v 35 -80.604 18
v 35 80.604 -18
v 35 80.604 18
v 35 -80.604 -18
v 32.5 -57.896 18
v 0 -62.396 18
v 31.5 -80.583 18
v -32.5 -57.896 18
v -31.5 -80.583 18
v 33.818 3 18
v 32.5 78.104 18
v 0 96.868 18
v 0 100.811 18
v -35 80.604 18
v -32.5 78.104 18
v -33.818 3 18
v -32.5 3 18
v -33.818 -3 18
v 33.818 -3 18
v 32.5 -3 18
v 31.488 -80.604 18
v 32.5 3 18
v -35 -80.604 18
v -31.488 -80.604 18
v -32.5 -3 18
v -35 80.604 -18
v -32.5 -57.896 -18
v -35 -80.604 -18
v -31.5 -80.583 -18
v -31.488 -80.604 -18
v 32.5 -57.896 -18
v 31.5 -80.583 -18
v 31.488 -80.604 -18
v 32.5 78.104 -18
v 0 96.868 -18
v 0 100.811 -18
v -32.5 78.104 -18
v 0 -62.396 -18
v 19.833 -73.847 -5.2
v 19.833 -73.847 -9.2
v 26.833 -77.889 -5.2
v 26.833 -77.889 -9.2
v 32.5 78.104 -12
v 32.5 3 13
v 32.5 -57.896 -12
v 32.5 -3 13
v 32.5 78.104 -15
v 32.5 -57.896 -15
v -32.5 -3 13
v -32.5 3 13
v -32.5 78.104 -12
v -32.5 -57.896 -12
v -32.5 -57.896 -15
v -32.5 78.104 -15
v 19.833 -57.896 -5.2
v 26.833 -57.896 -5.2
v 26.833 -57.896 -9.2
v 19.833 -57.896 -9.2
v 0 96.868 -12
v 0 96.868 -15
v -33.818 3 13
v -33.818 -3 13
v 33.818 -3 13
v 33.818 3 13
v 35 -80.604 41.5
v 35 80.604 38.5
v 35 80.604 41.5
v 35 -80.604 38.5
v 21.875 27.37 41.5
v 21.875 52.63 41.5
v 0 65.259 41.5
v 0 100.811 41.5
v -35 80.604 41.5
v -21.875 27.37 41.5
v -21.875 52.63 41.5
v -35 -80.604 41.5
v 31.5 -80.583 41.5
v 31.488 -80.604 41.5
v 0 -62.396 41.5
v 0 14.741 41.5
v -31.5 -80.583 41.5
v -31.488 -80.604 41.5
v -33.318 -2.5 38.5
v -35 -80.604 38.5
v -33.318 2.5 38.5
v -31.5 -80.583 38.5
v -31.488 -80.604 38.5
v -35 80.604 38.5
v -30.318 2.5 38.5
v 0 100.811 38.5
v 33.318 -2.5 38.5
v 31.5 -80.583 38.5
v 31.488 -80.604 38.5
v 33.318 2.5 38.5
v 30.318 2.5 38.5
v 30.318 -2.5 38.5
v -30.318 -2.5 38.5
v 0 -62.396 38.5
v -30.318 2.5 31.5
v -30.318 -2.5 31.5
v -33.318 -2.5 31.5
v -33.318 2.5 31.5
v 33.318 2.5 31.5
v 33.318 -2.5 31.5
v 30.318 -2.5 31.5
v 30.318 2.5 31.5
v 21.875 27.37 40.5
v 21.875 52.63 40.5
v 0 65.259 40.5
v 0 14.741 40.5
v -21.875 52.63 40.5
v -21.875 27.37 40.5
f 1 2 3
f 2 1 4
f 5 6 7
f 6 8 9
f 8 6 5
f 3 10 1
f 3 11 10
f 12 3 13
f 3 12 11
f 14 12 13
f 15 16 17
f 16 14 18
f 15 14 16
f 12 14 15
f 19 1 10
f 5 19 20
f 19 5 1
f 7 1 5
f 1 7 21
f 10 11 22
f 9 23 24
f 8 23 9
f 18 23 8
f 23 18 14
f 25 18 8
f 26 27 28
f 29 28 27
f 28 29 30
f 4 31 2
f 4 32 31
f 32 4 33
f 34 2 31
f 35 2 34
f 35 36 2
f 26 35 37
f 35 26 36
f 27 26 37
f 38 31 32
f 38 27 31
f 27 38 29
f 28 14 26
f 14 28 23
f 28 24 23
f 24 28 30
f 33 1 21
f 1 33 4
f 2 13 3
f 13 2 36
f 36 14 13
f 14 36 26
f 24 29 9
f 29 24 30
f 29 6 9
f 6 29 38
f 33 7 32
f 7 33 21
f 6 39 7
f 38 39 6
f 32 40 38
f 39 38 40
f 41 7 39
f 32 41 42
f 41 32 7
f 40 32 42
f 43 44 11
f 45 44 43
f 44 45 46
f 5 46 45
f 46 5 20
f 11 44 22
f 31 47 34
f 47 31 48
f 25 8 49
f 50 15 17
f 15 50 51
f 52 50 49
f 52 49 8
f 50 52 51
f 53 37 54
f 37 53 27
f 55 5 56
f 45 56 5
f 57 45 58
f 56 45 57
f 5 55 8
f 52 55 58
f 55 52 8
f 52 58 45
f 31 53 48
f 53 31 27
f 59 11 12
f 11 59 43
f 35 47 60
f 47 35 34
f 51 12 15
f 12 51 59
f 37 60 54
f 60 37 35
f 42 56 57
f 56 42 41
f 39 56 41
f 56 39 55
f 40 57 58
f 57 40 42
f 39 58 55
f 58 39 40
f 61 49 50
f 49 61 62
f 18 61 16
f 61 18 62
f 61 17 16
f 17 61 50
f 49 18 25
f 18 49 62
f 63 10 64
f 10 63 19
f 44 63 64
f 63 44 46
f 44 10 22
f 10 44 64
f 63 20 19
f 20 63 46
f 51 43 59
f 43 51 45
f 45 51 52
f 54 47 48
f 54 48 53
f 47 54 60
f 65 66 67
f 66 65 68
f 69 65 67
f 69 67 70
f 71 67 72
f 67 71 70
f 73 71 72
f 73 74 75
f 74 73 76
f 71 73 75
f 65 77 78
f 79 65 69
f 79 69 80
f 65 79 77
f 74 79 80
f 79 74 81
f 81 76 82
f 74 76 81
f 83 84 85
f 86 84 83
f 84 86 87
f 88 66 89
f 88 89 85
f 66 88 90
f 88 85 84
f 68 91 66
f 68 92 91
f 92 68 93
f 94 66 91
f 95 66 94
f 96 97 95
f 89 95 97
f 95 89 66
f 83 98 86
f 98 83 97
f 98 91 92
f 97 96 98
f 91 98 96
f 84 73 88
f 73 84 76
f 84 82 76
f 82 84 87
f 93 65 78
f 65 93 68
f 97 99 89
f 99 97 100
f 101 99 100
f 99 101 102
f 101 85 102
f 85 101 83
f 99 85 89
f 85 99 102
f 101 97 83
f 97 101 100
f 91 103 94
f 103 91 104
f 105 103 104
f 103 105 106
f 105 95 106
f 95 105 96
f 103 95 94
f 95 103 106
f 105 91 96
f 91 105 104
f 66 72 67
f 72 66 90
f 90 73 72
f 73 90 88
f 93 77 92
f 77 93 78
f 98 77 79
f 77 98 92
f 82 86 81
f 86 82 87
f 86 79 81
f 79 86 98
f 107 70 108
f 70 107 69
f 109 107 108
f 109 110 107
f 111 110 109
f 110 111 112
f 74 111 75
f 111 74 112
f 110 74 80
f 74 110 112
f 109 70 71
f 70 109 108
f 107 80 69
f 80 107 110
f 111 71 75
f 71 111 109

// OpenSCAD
$fn = 100;

// Functions for calculating the half-hexagons
function edge_length(width) = (width/2) / cos(30); // CAH
function point_height(width) = (width/2) * tan(30); // TOA
function leg(width) = edge_length(width) * sqrt(1/2);
function x_offset(width) = (width/2) - (leg(width) * cos(15));
function y_offset(width, length) = (length/2) - (leg(width) * sin(15));

//function x_offset2(width) = (width/2) + (leg(width) * sin(15));
function y_offset2(width, length) = (length/2) + (leg(width) * cos(15)) - point_height(w) + 2; // +2 is arbitrary, should fix.

// Values for wall thickness
h_pad = -1;
w_pad = 5;
l_pad = 5;

// Core size variables
lip = 3;
h = 33 + lip;
w = 65 + w_pad;
l = 86 + 50 + l_pad + point_height(w); // 86 = Pi, 50 = Dongle

btm = w*0.9;

difference(){ // Between the exterior and interior
// The exterior shape
difference(){ // For the btm (bottom) cutout
union(){
cube([w, l, h], center=true); // Center Cube

translate([x_offset(w),y_offset(w,l),0]){
	rotate([0,0,-30]) cube([edge_length(w),edge_length(w),h], center=true);
}
translate([-x_offset(w),y_offset(w,l),0]){
	rotate([0,0,30]) cube([edge_length(w),edge_length(w),h], center=true);
}}
translate([-x_offset(btm),-y_offset2(btm,l),0]){
	rotate([0,0,30]) cube([edge_length(btm),edge_length(btm),h-h_pad], center=true);
}
translate([x_offset(btm),-y_offset2(btm,l),0]){
	rotate([0,0,-30]) cube([edge_length(btm),edge_length(btm),h-h_pad], center=true);
}}

// The interior cutout
union(){
translate([0,point_height(w)/2,0]){
cube([w-w_pad, l-l_pad- point_height(w), h-h_pad], center=true); // Center Cube
}
translate([x_offset(w-w_pad),y_offset(w-w_pad,l-l_pad),0]){
	rotate([0,0,-30]) cube([edge_length(w-w_pad),edge_length(w-w_pad),h-h_pad], center=true);
}
translate([-x_offset(w-w_pad),y_offset(w-w_pad,l-l_pad),0]){
	rotate([0,0,30]) cube([edge_length(w-w_pad),edge_length(w-w_pad),h-h_pad], center=true);
}}
translate([w/3,-l/2+point_height(w),-h/5]){cube([7, 40, 4], center=true);}
translate([-w/2.2,0,h/2]){cube([4, 6, 10], center=true);}
translate([w/2.2,0,h/2]){cube([4, 6, 10], center=true);}
}


// The floor of the case
translate([0,0,-(h/2)+(h_lid/2)+lip]){
difference(){
union(){
cube([w, l, h_lid], center=true); // Center Cube

translate([x_offset(w),y_offset(w,l),0]){
	rotate([0,0,-30]) cube([edge_length(w),edge_length(w),h_lid], center=true);
}
translate([-x_offset(w),y_offset(w,l),0]){
	rotate([0,0,30]) cube([edge_length(w),edge_length(w),h_lid], center=true);
}}
translate([-x_offset(btm),-y_offset2(btm,l),0]){
	rotate([0,0,30]) cube([edge_length(btm),edge_length(btm),h_lid-h_pad], center=true);
}
translate([x_offset(btm),-y_offset2(btm,l),0]){
	rotate([0,0,-30]) cube([edge_length(btm),edge_length(btm),h_lid-h_pad], center=true);
}}}


// The lid
h_lid = 3;
function hex_len(width) = 2 * (cos(30) * width);
hex_edge = edge_length(w/1.6);

translate([0,0,40]){
difference(){
difference(){
union(){
cube([w, l, h_lid], center=true); // Center Cube
translate([-w/2.2,0,-h_lid*1.5]){cube([3, 5, 8], center=true);} // The teeth
translate([w/2.2,0,-h_lid*1.5]){cube([3, 5, 8], center=true);}
translate([x_offset(w),y_offset(w,l),0]){
	rotate([0,0,-30]) cube([edge_length(w),edge_length(w),h_lid], center=true);
}
translate([-x_offset(w),y_offset(w,l),0]){
	rotate([0,0,30]) cube([edge_length(w),edge_length(w),h_lid], center=true);
}}
translate([x_offset(btm),-y_offset2(btm,l),0]){
	rotate([0,0,-30]) cube([edge_length(btm),edge_length(btm),h_lid-h_pad], center=true);
}
translate([-x_offset(btm),-y_offset2(btm,l),0]){
	rotate([0,0,30]) cube([edge_length(btm),edge_length(btm),h_lid-h_pad], center=true);
}}

// The cutout
translate([0,40,2]){
union(){
	rotate([0,0,0]) cube([hex_len(hex_edge),hex_edge,h_lid], center=true);
	rotate([0,0,60]) cube([hex_len(hex_edge),hex_edge,h_lid], center=true);
	rotate([0,0,120]) cube([hex_len(hex_edge),hex_edge,h_lid], center=true);
}}}}
